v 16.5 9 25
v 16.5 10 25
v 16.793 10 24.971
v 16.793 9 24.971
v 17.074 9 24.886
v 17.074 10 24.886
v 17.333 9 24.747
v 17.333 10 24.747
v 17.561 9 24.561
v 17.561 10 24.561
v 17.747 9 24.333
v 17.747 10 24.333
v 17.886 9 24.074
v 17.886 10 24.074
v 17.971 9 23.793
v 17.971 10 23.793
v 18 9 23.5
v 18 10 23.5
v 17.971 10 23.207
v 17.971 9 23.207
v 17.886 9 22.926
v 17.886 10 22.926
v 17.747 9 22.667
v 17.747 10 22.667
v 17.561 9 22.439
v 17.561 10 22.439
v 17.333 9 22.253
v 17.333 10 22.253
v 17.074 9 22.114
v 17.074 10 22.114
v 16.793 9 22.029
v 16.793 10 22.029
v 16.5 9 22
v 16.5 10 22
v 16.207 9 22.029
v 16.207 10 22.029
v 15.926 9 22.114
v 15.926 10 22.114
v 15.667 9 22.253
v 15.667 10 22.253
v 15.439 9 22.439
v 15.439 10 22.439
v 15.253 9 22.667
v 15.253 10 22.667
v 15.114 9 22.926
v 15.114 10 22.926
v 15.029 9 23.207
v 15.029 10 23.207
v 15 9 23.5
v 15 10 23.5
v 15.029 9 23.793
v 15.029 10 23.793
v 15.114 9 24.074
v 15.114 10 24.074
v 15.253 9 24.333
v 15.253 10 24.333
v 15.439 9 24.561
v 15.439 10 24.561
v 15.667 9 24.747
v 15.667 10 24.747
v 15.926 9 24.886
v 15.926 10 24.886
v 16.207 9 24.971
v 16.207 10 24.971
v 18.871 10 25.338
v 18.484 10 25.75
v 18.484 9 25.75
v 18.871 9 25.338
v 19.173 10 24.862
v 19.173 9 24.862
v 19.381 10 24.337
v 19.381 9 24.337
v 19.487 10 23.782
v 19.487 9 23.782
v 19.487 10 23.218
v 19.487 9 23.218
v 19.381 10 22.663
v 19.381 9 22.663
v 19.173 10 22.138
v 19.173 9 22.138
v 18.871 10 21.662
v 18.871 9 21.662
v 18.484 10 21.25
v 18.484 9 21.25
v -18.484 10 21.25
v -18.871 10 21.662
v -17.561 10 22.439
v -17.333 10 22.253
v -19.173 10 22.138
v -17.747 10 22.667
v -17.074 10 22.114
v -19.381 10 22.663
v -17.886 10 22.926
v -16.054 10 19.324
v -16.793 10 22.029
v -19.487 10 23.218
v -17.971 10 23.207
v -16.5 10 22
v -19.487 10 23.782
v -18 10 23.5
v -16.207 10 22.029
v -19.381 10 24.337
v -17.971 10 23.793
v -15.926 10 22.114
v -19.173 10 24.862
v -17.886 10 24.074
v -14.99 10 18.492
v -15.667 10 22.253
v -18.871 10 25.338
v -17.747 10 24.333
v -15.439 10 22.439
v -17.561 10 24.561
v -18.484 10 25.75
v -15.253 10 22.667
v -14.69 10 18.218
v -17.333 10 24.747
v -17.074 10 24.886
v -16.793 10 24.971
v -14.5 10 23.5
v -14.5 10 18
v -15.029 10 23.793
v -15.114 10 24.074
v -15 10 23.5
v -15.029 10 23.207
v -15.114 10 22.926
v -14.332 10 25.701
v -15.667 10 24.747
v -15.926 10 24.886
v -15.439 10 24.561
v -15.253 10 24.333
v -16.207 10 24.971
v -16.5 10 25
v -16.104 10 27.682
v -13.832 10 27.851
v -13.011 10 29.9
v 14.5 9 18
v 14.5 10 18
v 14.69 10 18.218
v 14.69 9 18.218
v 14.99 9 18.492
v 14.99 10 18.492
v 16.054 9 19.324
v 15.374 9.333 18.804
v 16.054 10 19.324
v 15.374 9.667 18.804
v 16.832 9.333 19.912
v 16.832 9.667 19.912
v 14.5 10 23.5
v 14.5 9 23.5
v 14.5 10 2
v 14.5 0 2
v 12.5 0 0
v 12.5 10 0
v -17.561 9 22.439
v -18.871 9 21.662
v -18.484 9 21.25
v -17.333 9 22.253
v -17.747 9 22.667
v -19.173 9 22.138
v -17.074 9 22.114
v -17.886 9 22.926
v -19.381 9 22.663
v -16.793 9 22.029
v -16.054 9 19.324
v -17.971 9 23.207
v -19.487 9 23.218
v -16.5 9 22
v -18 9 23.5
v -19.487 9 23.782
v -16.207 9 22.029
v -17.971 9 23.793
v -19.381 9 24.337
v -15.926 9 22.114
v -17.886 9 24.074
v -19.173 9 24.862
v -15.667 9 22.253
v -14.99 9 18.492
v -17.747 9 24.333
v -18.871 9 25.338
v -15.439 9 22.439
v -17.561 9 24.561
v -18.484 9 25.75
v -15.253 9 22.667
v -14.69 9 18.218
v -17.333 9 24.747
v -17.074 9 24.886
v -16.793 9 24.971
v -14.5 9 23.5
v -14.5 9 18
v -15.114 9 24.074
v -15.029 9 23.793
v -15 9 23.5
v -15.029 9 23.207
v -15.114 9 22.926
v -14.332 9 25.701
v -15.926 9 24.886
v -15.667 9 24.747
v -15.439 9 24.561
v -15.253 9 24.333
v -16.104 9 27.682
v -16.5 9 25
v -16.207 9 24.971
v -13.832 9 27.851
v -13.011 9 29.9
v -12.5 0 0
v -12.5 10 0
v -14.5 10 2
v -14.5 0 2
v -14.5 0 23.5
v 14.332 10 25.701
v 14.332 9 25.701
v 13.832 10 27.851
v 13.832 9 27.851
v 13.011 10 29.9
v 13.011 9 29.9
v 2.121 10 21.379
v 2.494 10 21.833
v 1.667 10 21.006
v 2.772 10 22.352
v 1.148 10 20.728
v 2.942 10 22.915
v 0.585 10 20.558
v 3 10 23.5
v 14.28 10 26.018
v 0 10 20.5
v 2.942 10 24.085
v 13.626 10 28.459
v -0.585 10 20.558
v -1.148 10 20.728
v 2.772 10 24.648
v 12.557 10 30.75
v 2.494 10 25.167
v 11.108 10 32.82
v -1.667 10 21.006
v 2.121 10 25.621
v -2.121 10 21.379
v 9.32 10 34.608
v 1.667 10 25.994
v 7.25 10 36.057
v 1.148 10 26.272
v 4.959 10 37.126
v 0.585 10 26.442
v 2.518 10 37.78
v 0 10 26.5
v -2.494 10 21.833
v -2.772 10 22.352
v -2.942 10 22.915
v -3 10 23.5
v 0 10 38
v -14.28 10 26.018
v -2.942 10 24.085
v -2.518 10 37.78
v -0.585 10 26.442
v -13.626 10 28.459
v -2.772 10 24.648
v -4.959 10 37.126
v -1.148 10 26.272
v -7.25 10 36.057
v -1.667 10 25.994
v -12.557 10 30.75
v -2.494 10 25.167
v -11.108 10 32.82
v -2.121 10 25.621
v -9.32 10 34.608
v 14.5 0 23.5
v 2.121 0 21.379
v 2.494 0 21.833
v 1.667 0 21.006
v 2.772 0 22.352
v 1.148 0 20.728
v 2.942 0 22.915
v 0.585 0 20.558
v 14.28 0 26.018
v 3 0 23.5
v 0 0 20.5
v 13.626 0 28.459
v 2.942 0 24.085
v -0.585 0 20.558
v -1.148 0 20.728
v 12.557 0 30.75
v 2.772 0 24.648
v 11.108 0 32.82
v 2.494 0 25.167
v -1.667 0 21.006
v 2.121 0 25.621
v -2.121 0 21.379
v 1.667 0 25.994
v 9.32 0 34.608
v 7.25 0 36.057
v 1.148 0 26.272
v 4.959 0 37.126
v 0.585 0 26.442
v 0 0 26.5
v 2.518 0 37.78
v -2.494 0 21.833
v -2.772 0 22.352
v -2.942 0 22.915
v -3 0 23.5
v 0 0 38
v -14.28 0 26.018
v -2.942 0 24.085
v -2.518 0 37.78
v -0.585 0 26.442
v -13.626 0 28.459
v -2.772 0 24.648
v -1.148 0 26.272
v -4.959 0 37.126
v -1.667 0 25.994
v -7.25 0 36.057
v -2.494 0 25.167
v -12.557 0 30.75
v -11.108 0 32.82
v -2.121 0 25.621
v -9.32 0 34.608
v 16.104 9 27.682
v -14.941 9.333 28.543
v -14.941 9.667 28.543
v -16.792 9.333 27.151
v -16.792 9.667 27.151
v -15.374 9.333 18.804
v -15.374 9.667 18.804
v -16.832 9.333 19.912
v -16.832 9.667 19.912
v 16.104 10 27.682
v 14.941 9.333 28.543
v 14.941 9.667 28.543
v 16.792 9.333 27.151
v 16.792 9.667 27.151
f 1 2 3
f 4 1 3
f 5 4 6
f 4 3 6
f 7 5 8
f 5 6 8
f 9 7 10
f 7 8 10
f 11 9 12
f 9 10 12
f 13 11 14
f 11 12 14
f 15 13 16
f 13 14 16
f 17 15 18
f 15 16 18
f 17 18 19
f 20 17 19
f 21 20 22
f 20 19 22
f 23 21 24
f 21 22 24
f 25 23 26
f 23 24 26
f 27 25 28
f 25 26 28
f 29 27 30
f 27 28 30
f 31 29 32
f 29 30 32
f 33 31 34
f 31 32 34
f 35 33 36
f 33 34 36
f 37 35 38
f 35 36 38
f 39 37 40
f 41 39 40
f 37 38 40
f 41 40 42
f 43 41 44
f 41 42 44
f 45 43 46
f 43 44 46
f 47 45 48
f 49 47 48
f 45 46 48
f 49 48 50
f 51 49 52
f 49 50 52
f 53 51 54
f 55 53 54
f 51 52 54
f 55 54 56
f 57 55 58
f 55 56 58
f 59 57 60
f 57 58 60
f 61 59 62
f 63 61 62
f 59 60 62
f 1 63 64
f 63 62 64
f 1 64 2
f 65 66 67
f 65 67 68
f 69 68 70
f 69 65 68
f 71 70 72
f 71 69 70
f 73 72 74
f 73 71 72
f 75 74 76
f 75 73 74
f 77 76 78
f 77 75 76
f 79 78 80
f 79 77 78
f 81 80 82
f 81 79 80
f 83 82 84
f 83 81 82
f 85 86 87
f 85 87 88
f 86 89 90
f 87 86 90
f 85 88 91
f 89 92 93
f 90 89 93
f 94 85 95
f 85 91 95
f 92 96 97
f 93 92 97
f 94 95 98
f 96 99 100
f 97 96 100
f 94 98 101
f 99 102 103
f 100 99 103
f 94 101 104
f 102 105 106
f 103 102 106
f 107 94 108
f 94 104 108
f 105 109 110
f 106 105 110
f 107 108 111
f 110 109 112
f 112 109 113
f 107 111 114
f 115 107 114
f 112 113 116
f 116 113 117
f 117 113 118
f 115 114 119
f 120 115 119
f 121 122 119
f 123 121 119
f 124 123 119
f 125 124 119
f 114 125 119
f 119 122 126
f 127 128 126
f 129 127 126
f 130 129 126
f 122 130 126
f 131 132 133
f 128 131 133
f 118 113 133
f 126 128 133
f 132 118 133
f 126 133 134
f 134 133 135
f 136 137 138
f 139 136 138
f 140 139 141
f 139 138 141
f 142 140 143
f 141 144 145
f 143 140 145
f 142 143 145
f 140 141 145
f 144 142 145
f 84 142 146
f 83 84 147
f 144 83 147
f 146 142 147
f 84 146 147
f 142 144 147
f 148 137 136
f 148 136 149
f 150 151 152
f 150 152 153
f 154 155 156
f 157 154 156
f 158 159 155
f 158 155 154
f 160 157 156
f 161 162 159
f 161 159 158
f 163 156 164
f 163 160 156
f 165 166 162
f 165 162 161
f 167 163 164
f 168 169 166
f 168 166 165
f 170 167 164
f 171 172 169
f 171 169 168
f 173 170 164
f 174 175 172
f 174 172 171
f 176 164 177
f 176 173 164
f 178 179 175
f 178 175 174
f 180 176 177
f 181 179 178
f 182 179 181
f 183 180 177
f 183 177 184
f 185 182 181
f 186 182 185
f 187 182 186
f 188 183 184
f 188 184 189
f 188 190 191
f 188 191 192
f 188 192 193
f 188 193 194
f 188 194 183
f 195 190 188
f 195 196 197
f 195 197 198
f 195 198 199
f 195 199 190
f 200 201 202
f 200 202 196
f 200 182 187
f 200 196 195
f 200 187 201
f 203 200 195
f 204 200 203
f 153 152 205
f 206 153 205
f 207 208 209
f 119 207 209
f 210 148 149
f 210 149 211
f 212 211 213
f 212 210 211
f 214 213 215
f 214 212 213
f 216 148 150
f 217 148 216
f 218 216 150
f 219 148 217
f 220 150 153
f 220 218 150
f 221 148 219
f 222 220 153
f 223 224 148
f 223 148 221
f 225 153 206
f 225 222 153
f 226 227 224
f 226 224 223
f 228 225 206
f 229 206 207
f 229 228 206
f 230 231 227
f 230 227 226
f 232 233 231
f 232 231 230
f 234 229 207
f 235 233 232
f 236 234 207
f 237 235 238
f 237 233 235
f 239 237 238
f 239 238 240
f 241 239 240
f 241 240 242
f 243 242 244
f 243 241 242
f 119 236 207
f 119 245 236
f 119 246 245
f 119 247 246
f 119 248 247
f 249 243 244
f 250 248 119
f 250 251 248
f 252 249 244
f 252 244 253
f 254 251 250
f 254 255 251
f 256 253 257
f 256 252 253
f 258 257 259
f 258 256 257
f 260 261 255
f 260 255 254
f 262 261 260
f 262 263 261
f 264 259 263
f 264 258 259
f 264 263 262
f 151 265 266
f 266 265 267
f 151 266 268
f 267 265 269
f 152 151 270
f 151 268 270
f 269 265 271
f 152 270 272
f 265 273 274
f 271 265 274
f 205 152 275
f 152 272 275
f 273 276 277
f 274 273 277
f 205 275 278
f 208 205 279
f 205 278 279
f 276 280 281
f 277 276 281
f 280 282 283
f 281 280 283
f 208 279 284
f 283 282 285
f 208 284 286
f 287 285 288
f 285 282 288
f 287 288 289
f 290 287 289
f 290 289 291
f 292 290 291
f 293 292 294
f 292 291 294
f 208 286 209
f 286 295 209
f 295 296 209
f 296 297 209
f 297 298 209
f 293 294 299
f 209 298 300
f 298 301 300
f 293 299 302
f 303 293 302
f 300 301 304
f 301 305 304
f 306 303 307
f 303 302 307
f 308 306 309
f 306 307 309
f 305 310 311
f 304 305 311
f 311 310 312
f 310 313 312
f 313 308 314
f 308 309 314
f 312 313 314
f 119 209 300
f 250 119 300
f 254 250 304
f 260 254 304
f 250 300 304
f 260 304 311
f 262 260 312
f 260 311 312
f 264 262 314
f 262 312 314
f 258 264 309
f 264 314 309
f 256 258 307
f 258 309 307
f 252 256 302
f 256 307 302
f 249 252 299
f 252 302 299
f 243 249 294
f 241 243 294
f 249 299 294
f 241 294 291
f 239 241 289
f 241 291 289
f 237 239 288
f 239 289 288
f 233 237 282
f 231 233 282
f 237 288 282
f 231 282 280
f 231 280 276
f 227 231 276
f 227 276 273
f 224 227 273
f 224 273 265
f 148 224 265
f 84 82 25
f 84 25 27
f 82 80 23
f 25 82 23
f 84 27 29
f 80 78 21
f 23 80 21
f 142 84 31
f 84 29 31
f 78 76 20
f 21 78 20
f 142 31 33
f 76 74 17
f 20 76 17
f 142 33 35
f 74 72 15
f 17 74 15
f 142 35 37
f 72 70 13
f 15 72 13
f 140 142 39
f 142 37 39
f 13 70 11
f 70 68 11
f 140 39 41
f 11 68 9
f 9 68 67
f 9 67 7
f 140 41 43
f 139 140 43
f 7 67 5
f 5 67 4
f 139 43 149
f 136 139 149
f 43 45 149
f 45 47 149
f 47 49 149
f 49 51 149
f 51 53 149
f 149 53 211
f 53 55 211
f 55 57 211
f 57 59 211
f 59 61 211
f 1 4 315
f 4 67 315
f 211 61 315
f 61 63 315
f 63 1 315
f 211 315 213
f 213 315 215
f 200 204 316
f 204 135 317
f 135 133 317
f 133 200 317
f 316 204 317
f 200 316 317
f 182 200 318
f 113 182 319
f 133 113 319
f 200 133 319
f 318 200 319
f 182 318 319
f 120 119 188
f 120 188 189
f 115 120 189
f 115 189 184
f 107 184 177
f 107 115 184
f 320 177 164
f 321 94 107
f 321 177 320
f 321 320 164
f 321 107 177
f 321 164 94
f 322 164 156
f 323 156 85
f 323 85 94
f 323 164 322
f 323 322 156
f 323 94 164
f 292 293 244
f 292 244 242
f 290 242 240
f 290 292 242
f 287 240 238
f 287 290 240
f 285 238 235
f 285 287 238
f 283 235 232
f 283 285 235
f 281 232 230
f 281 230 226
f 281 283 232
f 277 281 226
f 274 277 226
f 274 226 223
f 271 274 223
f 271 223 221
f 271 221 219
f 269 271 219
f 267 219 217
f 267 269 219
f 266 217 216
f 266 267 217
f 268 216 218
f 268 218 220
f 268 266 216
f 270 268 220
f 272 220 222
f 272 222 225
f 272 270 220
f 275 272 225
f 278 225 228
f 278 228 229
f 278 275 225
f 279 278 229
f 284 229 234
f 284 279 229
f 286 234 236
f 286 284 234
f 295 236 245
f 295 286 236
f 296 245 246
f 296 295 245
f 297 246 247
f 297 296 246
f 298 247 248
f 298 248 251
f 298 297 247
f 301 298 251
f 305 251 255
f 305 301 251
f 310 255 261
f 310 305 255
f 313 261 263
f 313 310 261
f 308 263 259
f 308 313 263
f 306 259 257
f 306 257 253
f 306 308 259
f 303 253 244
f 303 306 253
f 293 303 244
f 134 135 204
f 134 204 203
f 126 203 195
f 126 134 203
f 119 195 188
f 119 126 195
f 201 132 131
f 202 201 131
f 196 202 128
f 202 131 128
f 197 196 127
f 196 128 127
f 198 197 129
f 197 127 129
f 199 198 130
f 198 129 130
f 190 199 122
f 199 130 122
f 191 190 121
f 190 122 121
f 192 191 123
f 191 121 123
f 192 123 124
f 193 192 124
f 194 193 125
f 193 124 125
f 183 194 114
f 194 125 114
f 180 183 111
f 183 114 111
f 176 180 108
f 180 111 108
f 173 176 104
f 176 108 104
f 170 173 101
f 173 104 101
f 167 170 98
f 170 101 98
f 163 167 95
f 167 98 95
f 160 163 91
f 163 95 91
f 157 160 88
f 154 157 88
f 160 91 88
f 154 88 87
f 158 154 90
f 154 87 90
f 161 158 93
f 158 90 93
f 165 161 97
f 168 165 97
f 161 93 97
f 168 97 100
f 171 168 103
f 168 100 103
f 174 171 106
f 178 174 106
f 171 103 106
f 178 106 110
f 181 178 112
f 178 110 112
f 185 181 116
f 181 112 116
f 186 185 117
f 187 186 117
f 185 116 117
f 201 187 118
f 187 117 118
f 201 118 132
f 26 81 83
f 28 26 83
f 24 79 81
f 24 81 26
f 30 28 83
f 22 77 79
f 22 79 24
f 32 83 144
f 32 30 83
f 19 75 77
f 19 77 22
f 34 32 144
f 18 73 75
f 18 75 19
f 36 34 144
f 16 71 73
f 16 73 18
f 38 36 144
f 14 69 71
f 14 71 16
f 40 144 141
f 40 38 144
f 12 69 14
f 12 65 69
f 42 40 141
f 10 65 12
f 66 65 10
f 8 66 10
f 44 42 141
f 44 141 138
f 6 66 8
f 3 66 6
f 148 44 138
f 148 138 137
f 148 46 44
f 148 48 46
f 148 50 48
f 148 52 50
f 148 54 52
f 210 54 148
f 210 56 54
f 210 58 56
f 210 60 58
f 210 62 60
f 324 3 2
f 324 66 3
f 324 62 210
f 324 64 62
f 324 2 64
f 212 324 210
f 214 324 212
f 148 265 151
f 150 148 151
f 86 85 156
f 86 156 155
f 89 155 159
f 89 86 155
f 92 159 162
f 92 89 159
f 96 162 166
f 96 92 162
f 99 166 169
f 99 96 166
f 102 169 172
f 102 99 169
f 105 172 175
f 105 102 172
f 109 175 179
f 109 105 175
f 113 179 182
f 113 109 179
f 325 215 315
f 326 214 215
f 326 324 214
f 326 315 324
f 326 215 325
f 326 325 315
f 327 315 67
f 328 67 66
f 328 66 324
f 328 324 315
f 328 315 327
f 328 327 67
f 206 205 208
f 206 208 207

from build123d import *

# Parameters (mm, degrees)
CROQUIS1_R                = 3
SALIENTE_EXTRUIR1_DEPTH   = 10
CROQUIS2_R                = 1.5
SALIENTE_EXTRUIR2_DEPTH   = 1
SALIENTE_EXTRUIR2_2_DEPTH = 1
CHAFL_N1_SIZE             = 2


with BuildPart() as part:
    # Croquis1 → Saliente-Extruir1 (new body)
    with BuildSketch(Plane(origin=(0, 0, 0), x_dir=(-1, 0, 0), z_dir=(0, 1, 0))):
        with BuildLine():
            Line((14.5, 0), (14.5, 23.5))
            ThreePointArc((14.5, 23.5), (0, 38), (-14.5, 23.5))
            Line((-14.5, 23.5), (-14.5, 0))
            Line((-14.5, 0), (14.5, 0))
        make_face()
        with Locations(Location((0, 23.5, 0), (0, 0, 90))):
            Circle(CROQUIS1_R, mode=Mode.SUBTRACT)
    extrude(amount=SALIENTE_EXTRUIR1_DEPTH)

    # Chaflán1
    chafl_n1_edges = [part.edges().sort_by_distance(p)[0] for p in [
        (-14.5, 5, 0),
        (14.5, 5, 0),
    ]]
    chamfer(chafl_n1_edges, length=CHAFL_N1_SIZE)


with BuildPart() as body_2:
    # Croquis2 → Saliente-Extruir2 (new body)
    with BuildSketch(Plane(origin=(0, 10, 0), x_dir=(-1, 0, 0), z_dir=(0, 1, 0))):
        with BuildLine():
            Line((-14.5, 18), (-14.5, 23.5))
            ThreePointArc((-14.5, 23.5), (-14.122863947, 26.785530998), (-13.011073939, 29.900152729))
            add(Edge.make_bspline(
                [(-13.011073939, 29.900152729), (-14.952678114, 28.568382729), (-16.899307295, 27.147844067), (-18.484313483, 25.75)],
                knots=[0, 0, 0, 0, 1, 1, 1, 1], degree=3))
            ThreePointArc((-18.484313483, 25.75), (-19.5, 23.5), (-18.484313483, 21.25))
            add(Edge.make_bspline(
                [(-14.5, 18), (-14.951474475, 18.627261122), (-16.864269141, 19.821255186), (-18.484313483, 21.25)],
                knots=[0.453928844, 0.453928844, 0.453928844, 0.453928844, 1, 1, 1, 1], degree=3))
        make_face()
        with Locations(Location((-16.5, 23.5, 0), (0, 0, 90))):
            Circle(CROQUIS2_R, mode=Mode.SUBTRACT)
    extrude(amount=-SALIENTE_EXTRUIR2_DEPTH)


with BuildPart() as body_3:
    # Croquis2 → Saliente-Extruir2 2 (new body)
    with BuildSketch(Plane(origin=(0, 10, 0), x_dir=(-1, 0, 0), z_dir=(0, 1, 0))):
        with BuildLine():
            add(Edge.make_bspline(
                [(13.011073939, 29.900152729), (14.952678114, 28.568382729), (16.899307295, 27.147844067), (18.484313483, 25.75)],
                knots=[0, 0, 0, 0, 1, 1, 1, 1], degree=3))
            ThreePointArc((13.011073939, 29.900152729), (14.122863947, 26.785530998), (14.5, 23.5))
            Line((14.5, 23.5), (14.5, 18))
            add(Edge.make_bspline(
                [(14.5, 18), (14.951474475, 18.627261122), (16.864269141, 19.821255186), (18.484313483, 21.25)],
                knots=[0.453928844, 0.453928844, 0.453928844, 0.453928844, 1, 1, 1, 1], degree=3))
            ThreePointArc((18.484313483, 21.25), (19.5, 23.5), (18.484313483, 25.75))
        make_face()
        with Locations(Location((16.5, 23.5, 0), (0, 0, 90))):
            Circle(CROQUIS2_R, mode=Mode.SUBTRACT)
    extrude(amount=-SALIENTE_EXTRUIR2_2_DEPTH)


solid = Compound([part.part, body_2.part, body_3.part])
